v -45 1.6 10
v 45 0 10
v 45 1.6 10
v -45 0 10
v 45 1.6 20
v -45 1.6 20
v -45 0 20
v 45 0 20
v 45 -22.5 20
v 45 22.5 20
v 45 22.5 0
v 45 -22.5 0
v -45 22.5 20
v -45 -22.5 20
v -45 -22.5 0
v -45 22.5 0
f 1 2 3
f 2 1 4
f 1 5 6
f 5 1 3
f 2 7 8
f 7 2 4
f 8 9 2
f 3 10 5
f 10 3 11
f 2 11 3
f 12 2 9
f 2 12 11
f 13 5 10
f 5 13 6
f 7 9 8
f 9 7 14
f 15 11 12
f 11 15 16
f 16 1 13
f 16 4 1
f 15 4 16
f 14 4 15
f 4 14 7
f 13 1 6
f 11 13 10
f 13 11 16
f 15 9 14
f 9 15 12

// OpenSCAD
// Microscope slide drying rack
// Print orientation: base block on XY plane, slots open upward (+Z)

// ---------------- Parameters ----------------
block_len    = 90;    // base block length along X (mm)
block_wid    = 45;    // base block width along Y (mm)
block_h      = 20;    // base block height along Z (mm)

slot_count   = 10;    // number of microscope slide slots
slot_len     = 77;    // slot length along X (mm)
slot_w       = 1.6;   // slot width along Y (mm)
slot_depth   = 10;    // slot depth into block from top face (mm)
slot_pitch   = 3.5;   // centre-to-centre slot spacing along Y (mm)

eps          = 0.5;   // overshoot so cuts pass cleanly through the top face (mm)

$fn = 64;

// ---------------- Model ----------------
difference() {
    // Solid base block, centred in X and Y, sitting on z = 0
    translate([-block_len / 2, -block_wid / 2, 0])
        cube([block_len, block_wid, block_h]);

    // Parallel slots running along X, centred as a group in X and Y
    for (i = [0 : slot_count - 1]) {
        x = (i - (slot_count - 1) / 2) * slot_pitch;
        translate([x - slot_len / 2, 0, block_h - slot_depth])
            cube([slot_len, slot_w, slot_depth + eps]);
    }
}
